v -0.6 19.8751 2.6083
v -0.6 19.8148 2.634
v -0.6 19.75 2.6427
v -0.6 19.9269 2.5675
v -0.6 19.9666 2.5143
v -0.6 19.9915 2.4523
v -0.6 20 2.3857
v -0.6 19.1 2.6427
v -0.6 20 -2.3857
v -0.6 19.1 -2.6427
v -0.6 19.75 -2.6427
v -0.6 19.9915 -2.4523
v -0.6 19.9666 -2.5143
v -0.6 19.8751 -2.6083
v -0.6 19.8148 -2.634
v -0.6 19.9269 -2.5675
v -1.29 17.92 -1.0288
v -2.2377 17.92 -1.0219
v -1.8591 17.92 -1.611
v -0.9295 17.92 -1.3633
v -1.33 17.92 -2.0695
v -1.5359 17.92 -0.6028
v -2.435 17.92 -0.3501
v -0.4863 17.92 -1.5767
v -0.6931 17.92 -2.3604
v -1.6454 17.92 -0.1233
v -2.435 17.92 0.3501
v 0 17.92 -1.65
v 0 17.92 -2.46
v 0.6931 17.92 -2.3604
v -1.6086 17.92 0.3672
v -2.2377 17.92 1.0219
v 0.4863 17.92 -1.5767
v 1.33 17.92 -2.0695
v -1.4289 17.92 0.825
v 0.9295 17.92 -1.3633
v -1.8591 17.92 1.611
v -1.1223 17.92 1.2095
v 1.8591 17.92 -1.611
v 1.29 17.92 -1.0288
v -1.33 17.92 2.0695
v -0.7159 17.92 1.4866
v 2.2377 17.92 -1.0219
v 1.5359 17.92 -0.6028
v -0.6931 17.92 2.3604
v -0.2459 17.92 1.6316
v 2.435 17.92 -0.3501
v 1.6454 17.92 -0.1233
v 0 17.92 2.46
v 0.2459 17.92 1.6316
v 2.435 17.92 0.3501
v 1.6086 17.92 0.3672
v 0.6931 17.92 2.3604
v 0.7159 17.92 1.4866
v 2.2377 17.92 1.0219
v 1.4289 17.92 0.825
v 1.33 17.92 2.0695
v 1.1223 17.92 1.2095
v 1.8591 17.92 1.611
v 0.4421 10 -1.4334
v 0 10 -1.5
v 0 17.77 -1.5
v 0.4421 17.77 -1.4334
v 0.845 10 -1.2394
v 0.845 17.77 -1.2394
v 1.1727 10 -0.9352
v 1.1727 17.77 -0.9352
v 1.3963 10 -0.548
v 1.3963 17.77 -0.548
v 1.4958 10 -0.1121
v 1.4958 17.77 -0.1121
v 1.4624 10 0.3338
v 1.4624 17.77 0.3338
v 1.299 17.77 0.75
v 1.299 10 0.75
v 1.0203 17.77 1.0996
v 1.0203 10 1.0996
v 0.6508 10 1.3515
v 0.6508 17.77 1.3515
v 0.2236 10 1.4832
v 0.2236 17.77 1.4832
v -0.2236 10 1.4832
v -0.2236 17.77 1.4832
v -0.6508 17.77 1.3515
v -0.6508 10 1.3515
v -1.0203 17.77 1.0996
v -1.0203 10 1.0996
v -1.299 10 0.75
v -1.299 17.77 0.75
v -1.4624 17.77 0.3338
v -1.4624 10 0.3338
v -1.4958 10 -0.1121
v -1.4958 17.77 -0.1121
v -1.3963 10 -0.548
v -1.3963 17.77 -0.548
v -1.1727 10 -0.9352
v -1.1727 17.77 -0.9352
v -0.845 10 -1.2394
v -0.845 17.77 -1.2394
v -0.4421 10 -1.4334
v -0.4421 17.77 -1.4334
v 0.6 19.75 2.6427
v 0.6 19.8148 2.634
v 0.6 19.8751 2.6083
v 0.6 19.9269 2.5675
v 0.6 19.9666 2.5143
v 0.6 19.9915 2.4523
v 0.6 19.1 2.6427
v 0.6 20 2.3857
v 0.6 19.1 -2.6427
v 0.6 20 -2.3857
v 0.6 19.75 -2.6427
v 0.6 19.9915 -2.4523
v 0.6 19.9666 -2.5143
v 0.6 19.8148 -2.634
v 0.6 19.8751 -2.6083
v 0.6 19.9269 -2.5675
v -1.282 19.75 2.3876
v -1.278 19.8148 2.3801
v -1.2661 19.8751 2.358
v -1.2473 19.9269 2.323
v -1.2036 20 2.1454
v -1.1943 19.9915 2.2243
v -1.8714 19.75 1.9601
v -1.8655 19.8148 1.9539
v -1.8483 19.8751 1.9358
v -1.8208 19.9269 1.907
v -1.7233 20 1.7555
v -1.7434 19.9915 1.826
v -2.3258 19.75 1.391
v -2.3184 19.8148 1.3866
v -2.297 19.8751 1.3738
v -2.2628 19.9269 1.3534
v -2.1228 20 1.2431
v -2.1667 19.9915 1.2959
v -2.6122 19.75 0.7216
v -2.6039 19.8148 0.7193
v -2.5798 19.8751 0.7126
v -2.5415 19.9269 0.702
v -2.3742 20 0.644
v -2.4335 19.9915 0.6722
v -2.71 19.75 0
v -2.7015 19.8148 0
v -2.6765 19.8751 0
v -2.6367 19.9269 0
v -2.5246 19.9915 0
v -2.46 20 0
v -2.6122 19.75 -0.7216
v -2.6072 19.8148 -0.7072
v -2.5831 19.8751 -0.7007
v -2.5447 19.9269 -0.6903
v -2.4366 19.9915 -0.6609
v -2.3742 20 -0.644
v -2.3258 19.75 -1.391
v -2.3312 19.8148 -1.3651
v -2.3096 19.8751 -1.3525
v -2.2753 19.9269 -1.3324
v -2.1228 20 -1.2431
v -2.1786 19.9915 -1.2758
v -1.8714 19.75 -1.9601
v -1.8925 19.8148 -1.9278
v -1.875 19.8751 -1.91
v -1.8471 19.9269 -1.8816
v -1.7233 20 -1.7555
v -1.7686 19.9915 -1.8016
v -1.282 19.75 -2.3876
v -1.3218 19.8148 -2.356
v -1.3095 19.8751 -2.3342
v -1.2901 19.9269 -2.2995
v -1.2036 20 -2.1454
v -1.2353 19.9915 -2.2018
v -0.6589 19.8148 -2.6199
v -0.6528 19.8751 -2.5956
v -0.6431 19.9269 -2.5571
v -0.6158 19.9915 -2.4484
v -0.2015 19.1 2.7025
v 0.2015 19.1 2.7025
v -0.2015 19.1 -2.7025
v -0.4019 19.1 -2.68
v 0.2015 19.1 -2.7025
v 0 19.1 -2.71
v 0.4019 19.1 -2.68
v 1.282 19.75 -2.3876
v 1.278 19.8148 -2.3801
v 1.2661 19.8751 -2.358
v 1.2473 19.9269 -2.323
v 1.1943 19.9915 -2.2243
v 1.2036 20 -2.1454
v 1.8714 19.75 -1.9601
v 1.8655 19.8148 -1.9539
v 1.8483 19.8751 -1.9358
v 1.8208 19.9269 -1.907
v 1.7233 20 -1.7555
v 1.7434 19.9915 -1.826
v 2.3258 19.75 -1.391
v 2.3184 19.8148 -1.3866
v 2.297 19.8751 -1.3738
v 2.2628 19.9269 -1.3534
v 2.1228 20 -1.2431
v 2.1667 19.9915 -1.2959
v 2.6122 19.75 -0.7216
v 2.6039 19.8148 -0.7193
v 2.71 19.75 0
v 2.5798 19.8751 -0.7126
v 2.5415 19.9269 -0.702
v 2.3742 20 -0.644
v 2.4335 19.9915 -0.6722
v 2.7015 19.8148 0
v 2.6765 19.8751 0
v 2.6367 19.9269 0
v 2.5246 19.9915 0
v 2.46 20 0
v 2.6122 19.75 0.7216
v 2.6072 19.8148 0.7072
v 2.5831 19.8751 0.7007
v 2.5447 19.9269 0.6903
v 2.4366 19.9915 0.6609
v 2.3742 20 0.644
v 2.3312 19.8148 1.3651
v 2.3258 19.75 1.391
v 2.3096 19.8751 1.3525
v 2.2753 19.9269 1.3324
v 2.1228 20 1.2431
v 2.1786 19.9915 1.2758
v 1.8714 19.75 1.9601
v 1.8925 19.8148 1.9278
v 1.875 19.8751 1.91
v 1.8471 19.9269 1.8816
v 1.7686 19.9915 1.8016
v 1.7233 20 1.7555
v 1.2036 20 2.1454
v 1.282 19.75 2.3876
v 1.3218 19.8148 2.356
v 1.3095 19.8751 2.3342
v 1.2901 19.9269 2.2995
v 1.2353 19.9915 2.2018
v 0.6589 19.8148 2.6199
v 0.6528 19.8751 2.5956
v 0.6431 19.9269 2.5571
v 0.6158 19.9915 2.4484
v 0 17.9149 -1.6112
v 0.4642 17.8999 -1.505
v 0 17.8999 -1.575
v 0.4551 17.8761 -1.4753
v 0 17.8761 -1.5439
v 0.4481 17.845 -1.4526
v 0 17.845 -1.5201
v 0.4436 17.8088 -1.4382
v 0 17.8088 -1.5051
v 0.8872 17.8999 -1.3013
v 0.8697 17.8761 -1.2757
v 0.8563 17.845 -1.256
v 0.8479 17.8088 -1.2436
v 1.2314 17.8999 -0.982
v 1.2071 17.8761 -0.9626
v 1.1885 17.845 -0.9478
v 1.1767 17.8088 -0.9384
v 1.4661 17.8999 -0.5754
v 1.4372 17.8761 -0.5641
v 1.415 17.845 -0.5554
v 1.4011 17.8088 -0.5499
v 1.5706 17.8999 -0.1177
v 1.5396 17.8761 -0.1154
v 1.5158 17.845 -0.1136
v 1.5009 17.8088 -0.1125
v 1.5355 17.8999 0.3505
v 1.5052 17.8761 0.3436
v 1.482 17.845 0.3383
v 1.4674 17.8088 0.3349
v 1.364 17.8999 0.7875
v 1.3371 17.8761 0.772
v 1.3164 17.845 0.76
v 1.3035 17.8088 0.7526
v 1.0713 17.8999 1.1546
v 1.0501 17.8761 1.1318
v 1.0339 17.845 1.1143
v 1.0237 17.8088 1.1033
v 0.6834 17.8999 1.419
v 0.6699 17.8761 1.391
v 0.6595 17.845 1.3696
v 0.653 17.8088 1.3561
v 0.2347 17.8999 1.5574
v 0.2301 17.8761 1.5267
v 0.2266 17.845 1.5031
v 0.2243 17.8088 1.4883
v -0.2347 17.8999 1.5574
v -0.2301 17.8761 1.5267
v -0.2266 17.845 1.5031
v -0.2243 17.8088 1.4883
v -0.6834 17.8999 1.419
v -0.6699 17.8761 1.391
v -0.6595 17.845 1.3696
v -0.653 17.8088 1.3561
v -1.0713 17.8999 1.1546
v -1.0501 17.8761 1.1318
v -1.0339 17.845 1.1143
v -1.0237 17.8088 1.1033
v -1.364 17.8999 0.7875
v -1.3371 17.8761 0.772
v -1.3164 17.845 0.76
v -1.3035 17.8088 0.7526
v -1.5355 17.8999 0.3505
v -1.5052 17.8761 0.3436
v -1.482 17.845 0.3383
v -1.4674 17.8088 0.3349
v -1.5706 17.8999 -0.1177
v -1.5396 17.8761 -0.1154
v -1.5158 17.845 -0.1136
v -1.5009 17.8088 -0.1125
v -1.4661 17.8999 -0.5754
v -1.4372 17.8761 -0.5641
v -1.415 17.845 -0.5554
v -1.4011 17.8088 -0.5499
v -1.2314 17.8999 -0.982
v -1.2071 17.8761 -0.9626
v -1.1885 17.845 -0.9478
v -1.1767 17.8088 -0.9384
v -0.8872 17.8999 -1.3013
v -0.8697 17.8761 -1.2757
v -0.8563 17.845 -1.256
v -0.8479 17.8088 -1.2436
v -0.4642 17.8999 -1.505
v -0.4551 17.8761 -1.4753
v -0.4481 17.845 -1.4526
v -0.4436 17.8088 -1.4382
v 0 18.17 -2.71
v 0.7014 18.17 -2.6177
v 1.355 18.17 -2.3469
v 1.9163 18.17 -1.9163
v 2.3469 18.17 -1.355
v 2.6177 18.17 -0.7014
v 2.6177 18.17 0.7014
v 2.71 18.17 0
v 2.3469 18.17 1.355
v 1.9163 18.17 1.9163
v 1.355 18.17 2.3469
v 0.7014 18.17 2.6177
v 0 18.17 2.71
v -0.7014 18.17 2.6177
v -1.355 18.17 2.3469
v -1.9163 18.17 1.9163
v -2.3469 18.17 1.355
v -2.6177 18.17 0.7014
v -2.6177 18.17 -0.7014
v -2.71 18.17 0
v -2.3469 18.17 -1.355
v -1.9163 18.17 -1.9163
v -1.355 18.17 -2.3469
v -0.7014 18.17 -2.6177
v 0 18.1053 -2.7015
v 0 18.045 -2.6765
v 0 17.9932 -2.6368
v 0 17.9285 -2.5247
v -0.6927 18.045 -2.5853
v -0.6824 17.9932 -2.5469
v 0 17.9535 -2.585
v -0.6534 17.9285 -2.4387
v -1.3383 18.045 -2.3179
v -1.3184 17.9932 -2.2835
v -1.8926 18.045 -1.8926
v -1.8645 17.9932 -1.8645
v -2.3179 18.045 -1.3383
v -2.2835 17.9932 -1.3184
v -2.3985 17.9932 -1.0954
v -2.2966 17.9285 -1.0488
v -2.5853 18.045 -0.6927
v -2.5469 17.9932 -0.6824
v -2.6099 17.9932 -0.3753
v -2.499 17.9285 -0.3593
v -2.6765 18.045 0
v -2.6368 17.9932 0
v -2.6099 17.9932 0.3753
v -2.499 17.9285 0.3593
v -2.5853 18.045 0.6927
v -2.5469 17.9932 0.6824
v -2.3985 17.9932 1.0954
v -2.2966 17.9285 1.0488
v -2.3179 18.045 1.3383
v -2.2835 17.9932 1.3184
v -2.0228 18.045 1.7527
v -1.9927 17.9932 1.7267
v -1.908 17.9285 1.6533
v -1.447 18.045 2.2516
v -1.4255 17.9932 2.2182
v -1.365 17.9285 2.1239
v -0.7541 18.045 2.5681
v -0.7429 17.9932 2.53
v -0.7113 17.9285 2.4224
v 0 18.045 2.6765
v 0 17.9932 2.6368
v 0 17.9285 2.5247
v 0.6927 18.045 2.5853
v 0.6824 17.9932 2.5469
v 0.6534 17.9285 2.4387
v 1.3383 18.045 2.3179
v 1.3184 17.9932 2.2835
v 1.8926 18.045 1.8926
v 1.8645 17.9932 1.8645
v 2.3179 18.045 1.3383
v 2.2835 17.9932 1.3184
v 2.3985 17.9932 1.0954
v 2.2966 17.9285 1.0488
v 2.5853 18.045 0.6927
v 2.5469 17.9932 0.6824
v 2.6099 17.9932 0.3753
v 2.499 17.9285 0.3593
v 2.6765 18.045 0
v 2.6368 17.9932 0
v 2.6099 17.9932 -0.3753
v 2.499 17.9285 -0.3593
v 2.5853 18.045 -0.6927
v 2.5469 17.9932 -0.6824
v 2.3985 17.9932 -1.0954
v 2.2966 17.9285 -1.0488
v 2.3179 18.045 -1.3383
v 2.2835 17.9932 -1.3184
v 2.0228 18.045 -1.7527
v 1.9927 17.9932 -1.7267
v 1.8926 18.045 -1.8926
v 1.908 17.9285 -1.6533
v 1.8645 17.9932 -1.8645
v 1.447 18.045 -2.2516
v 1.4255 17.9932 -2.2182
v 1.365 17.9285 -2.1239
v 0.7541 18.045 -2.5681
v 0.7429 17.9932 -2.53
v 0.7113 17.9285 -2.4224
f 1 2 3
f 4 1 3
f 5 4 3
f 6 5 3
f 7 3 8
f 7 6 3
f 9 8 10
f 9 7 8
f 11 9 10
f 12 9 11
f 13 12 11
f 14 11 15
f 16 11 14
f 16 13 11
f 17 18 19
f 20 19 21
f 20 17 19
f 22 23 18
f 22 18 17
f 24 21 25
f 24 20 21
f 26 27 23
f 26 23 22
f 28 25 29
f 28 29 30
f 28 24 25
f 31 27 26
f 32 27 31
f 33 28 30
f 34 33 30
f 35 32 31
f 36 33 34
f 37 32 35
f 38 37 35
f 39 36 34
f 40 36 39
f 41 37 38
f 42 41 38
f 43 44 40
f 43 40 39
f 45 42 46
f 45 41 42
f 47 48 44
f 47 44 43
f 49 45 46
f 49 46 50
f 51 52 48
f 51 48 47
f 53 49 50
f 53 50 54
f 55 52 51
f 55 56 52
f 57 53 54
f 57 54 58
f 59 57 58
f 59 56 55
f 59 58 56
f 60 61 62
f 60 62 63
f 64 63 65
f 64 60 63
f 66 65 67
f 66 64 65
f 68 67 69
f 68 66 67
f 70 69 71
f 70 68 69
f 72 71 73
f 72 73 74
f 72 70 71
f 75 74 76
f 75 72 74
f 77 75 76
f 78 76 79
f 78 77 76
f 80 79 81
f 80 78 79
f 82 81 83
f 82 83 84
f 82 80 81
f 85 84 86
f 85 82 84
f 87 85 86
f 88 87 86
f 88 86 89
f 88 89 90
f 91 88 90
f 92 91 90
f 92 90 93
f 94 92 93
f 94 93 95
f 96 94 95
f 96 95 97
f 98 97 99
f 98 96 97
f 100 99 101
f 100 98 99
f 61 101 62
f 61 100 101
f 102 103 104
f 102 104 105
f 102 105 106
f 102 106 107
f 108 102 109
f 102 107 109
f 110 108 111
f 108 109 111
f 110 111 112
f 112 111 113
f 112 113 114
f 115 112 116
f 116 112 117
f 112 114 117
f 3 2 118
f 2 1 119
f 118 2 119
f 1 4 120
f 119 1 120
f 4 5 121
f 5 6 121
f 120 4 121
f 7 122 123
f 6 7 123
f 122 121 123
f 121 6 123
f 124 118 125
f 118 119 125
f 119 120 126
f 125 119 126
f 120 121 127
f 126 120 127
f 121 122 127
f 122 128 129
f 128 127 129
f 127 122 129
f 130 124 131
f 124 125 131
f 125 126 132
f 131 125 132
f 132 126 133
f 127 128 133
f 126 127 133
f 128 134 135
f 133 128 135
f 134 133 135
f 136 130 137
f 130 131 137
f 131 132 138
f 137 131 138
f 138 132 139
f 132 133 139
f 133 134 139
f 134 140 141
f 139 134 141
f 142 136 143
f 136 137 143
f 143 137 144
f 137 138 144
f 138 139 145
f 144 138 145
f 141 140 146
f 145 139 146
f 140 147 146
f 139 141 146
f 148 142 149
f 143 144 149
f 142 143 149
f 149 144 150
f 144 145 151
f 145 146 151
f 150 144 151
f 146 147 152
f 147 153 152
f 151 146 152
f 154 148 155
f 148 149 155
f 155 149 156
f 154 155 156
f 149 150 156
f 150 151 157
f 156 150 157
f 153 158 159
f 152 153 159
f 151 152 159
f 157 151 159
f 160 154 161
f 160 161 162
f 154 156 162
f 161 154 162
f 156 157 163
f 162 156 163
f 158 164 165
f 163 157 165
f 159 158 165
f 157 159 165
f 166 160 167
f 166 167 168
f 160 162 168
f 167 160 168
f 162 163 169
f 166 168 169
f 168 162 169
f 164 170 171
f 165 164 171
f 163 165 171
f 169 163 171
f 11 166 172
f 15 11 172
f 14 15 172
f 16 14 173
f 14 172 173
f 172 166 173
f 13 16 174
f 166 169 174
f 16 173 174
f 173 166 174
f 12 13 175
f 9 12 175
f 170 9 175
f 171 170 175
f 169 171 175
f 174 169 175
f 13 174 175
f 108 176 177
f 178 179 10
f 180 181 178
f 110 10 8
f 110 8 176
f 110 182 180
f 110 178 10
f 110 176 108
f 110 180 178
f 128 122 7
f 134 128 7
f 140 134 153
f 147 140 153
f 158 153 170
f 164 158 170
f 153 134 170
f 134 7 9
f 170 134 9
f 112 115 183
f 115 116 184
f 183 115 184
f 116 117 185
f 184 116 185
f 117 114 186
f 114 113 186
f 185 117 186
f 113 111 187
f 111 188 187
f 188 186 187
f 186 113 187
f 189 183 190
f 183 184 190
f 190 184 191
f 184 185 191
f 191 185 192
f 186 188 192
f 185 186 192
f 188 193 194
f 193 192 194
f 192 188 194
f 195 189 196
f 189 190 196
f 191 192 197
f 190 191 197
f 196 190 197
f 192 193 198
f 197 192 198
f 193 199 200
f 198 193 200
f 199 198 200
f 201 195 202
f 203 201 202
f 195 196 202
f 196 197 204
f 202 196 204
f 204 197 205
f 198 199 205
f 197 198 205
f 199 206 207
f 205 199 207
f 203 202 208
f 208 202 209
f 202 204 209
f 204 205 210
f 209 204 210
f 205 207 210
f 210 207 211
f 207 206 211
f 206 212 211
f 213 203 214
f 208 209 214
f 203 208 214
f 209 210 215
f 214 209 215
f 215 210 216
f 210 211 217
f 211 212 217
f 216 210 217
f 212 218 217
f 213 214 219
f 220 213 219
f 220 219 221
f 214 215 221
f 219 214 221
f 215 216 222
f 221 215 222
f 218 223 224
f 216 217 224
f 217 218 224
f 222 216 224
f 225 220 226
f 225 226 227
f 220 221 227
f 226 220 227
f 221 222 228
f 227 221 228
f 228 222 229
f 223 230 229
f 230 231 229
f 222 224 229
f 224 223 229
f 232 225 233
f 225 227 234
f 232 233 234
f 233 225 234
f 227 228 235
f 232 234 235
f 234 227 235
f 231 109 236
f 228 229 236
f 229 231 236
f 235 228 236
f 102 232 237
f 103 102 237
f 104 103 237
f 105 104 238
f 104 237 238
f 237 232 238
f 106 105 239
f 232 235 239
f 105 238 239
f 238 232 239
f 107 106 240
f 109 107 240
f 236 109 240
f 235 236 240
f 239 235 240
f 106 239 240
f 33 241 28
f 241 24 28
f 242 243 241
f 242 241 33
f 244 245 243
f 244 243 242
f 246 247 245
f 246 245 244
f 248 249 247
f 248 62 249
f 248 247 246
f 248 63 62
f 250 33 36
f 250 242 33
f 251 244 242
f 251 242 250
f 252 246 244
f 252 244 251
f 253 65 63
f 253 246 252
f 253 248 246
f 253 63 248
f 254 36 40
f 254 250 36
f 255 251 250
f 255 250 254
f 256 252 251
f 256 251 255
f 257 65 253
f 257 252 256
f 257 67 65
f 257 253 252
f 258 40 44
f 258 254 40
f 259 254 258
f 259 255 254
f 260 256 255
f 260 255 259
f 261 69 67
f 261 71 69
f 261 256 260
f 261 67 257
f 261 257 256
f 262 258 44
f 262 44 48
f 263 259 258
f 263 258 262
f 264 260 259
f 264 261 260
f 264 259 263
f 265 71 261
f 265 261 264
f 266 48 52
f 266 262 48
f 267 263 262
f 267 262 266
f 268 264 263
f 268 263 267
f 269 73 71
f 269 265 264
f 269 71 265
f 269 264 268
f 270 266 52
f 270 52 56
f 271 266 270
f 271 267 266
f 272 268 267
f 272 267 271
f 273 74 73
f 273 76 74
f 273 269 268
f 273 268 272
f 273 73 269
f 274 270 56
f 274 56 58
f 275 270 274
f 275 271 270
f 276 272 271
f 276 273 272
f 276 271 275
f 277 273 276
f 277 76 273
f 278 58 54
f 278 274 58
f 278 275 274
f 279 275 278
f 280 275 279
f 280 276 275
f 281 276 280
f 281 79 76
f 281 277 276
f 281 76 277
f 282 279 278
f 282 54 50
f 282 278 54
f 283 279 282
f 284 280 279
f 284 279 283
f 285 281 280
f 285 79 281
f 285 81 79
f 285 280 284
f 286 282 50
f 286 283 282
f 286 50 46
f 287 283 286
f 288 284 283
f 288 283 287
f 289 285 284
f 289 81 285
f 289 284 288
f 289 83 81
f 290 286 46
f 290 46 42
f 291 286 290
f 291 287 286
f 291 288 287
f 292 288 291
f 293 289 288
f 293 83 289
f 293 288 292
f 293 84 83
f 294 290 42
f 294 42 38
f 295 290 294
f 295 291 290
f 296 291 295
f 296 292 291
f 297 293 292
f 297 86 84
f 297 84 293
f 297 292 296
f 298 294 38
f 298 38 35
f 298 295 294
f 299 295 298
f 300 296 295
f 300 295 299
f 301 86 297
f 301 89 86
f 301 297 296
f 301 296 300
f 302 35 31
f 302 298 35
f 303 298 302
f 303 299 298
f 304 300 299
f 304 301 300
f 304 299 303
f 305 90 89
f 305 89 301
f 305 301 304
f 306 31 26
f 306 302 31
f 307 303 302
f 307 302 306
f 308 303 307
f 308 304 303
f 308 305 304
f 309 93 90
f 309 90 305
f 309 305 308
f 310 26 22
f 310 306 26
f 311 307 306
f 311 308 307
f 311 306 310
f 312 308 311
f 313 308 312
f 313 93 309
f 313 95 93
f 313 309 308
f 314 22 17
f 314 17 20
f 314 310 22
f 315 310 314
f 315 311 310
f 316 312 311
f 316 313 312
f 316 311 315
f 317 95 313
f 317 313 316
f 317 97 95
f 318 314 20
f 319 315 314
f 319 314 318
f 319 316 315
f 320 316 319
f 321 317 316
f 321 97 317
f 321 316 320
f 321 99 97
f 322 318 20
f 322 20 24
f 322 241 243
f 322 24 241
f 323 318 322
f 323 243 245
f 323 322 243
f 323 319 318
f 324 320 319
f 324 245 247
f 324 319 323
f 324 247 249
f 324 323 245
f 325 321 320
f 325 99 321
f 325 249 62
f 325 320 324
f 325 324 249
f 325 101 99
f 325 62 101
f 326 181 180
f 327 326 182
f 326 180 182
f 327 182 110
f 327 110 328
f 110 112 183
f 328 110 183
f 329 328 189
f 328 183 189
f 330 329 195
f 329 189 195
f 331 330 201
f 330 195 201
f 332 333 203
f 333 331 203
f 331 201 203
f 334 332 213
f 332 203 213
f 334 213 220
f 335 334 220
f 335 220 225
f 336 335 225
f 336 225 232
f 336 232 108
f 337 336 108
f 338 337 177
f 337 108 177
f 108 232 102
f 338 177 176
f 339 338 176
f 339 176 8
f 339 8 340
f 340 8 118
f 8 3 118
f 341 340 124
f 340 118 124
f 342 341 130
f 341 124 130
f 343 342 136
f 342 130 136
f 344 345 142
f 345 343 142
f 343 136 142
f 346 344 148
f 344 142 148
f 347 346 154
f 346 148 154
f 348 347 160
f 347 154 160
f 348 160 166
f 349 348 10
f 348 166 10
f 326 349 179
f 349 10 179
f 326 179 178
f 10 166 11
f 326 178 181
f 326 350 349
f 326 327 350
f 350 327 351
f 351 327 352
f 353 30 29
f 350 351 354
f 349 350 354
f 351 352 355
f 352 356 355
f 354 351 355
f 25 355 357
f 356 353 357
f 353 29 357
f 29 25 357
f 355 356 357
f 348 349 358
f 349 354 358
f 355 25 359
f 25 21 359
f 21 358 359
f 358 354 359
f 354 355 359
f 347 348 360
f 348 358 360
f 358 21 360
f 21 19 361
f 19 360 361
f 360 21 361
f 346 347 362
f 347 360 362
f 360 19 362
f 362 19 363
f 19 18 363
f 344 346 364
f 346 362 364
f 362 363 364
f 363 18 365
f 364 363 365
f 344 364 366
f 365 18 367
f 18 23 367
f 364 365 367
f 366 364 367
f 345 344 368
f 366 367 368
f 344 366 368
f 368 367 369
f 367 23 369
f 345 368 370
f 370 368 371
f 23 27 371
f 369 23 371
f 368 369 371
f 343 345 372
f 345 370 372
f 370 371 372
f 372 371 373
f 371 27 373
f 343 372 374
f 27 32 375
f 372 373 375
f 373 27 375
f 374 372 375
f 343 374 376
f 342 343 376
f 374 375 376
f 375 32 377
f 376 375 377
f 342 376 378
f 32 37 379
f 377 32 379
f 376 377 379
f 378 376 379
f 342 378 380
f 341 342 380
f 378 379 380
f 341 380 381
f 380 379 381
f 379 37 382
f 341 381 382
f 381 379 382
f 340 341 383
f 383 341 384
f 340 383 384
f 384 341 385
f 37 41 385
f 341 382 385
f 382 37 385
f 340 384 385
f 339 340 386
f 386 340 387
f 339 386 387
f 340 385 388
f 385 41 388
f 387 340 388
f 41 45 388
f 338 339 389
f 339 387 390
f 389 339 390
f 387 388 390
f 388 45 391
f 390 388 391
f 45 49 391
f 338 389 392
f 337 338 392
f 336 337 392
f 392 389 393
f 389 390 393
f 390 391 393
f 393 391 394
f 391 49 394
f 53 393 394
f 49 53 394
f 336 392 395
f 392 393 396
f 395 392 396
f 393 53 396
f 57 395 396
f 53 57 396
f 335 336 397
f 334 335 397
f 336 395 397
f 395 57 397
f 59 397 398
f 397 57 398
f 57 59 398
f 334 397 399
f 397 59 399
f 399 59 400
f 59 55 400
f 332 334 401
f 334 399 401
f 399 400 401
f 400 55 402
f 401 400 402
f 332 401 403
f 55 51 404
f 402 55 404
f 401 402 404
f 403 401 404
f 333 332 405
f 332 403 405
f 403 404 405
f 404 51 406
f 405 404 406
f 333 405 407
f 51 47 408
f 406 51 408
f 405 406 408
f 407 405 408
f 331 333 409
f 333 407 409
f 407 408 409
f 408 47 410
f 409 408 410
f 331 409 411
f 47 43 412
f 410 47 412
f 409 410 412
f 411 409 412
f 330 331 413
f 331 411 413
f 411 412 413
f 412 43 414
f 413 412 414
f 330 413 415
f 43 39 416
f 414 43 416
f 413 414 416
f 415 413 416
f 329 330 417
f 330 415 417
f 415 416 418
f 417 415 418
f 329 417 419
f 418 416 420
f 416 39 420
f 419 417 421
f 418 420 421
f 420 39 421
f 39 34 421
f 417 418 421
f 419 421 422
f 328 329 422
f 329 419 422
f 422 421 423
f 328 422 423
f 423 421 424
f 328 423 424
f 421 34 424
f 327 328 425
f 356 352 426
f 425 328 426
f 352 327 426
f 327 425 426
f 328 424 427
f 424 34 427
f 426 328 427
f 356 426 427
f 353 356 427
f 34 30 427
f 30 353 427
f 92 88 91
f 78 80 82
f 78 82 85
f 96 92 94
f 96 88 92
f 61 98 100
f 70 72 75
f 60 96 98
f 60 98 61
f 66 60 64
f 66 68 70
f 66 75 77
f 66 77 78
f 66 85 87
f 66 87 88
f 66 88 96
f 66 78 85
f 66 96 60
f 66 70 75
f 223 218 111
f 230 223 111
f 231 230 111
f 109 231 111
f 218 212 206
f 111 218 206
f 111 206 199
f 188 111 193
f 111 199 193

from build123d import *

# Parameters (mm, degrees)
SKETCH1_R             = 2.71
BOSS_EXTRUDE1_DEPTH   = 10
SKETCH2_OUTSIDE_W     = 9.94
SKETCH2_OUTSIDE_H     = 9.94
SKETCH2_OUTSIDE_R     = 1.5
CUT_EXTRUDE1_DEPTH    = 7.92
FILLET1_R             = 0.25
FILLET2_R             = 0.15
SKETCH3_W             = 1.2
SKETCH3_H             = 5.422046684
CUT_EXTRUDE2_DEPTH    = 0.9
BODY_MOVE_COPY1_ANGLE = 180


with BuildPart() as part:
    # Sketch1 → Boss-Extrude1 (new body)
    with BuildSketch(Plane(origin=(0, 0, 0), x_dir=(1, 0, 0), z_dir=(0, 1, 0))):
        with Locations(Location((0, 0, 0), (0, 0, 270))):
            Circle(SKETCH1_R)
    extrude(amount=BOSS_EXTRUDE1_DEPTH)

    # Sketch2 outside → Cut-Extrude1 (cut)
    with BuildSketch(Plane(origin=(0, 10, 0), x_dir=(1, 0, 0), z_dir=(0, 1, 0))):
        Rectangle(SKETCH2_OUTSIDE_W, SKETCH2_OUTSIDE_H)
        with Locations(Location((0, 0, 0), (0, 0, 270))):
            Circle(SKETCH2_OUTSIDE_R, mode=Mode.SUBTRACT)
    extrude(amount=-CUT_EXTRUDE1_DEPTH, mode=Mode.SUBTRACT)

    # Fillet1
    fillet1_edges = [part.edges().sort_by_distance(p)[0] for p in [
        (0, 0, -2.71),
        (0, 2.08, -2.71),
    ]]
    fillet(fillet1_edges, radius=FILLET1_R)

    # Fillet2
    fillet2_edges = [part.edges().sort_by_distance(p)[0] for p in [
        (0, 2.08, -1.5),
    ]]
    fillet(fillet2_edges, radius=FILLET2_R)

    # Sketch3 → Cut-Extrude2 (cut)
    with BuildSketch(Plane.XZ):
        Rectangle(SKETCH3_W, SKETCH3_H)
    extrude(amount=-CUT_EXTRUDE2_DEPTH, mode=Mode.SUBTRACT)


with BuildPart() as part_1:
    # Body-Move/Copy1: moved
    add(part.part.rotate(Axis((0, 10, 0), (1, 0, 0)), BODY_MOVE_COPY1_ANGLE))


solid = part_1.part
